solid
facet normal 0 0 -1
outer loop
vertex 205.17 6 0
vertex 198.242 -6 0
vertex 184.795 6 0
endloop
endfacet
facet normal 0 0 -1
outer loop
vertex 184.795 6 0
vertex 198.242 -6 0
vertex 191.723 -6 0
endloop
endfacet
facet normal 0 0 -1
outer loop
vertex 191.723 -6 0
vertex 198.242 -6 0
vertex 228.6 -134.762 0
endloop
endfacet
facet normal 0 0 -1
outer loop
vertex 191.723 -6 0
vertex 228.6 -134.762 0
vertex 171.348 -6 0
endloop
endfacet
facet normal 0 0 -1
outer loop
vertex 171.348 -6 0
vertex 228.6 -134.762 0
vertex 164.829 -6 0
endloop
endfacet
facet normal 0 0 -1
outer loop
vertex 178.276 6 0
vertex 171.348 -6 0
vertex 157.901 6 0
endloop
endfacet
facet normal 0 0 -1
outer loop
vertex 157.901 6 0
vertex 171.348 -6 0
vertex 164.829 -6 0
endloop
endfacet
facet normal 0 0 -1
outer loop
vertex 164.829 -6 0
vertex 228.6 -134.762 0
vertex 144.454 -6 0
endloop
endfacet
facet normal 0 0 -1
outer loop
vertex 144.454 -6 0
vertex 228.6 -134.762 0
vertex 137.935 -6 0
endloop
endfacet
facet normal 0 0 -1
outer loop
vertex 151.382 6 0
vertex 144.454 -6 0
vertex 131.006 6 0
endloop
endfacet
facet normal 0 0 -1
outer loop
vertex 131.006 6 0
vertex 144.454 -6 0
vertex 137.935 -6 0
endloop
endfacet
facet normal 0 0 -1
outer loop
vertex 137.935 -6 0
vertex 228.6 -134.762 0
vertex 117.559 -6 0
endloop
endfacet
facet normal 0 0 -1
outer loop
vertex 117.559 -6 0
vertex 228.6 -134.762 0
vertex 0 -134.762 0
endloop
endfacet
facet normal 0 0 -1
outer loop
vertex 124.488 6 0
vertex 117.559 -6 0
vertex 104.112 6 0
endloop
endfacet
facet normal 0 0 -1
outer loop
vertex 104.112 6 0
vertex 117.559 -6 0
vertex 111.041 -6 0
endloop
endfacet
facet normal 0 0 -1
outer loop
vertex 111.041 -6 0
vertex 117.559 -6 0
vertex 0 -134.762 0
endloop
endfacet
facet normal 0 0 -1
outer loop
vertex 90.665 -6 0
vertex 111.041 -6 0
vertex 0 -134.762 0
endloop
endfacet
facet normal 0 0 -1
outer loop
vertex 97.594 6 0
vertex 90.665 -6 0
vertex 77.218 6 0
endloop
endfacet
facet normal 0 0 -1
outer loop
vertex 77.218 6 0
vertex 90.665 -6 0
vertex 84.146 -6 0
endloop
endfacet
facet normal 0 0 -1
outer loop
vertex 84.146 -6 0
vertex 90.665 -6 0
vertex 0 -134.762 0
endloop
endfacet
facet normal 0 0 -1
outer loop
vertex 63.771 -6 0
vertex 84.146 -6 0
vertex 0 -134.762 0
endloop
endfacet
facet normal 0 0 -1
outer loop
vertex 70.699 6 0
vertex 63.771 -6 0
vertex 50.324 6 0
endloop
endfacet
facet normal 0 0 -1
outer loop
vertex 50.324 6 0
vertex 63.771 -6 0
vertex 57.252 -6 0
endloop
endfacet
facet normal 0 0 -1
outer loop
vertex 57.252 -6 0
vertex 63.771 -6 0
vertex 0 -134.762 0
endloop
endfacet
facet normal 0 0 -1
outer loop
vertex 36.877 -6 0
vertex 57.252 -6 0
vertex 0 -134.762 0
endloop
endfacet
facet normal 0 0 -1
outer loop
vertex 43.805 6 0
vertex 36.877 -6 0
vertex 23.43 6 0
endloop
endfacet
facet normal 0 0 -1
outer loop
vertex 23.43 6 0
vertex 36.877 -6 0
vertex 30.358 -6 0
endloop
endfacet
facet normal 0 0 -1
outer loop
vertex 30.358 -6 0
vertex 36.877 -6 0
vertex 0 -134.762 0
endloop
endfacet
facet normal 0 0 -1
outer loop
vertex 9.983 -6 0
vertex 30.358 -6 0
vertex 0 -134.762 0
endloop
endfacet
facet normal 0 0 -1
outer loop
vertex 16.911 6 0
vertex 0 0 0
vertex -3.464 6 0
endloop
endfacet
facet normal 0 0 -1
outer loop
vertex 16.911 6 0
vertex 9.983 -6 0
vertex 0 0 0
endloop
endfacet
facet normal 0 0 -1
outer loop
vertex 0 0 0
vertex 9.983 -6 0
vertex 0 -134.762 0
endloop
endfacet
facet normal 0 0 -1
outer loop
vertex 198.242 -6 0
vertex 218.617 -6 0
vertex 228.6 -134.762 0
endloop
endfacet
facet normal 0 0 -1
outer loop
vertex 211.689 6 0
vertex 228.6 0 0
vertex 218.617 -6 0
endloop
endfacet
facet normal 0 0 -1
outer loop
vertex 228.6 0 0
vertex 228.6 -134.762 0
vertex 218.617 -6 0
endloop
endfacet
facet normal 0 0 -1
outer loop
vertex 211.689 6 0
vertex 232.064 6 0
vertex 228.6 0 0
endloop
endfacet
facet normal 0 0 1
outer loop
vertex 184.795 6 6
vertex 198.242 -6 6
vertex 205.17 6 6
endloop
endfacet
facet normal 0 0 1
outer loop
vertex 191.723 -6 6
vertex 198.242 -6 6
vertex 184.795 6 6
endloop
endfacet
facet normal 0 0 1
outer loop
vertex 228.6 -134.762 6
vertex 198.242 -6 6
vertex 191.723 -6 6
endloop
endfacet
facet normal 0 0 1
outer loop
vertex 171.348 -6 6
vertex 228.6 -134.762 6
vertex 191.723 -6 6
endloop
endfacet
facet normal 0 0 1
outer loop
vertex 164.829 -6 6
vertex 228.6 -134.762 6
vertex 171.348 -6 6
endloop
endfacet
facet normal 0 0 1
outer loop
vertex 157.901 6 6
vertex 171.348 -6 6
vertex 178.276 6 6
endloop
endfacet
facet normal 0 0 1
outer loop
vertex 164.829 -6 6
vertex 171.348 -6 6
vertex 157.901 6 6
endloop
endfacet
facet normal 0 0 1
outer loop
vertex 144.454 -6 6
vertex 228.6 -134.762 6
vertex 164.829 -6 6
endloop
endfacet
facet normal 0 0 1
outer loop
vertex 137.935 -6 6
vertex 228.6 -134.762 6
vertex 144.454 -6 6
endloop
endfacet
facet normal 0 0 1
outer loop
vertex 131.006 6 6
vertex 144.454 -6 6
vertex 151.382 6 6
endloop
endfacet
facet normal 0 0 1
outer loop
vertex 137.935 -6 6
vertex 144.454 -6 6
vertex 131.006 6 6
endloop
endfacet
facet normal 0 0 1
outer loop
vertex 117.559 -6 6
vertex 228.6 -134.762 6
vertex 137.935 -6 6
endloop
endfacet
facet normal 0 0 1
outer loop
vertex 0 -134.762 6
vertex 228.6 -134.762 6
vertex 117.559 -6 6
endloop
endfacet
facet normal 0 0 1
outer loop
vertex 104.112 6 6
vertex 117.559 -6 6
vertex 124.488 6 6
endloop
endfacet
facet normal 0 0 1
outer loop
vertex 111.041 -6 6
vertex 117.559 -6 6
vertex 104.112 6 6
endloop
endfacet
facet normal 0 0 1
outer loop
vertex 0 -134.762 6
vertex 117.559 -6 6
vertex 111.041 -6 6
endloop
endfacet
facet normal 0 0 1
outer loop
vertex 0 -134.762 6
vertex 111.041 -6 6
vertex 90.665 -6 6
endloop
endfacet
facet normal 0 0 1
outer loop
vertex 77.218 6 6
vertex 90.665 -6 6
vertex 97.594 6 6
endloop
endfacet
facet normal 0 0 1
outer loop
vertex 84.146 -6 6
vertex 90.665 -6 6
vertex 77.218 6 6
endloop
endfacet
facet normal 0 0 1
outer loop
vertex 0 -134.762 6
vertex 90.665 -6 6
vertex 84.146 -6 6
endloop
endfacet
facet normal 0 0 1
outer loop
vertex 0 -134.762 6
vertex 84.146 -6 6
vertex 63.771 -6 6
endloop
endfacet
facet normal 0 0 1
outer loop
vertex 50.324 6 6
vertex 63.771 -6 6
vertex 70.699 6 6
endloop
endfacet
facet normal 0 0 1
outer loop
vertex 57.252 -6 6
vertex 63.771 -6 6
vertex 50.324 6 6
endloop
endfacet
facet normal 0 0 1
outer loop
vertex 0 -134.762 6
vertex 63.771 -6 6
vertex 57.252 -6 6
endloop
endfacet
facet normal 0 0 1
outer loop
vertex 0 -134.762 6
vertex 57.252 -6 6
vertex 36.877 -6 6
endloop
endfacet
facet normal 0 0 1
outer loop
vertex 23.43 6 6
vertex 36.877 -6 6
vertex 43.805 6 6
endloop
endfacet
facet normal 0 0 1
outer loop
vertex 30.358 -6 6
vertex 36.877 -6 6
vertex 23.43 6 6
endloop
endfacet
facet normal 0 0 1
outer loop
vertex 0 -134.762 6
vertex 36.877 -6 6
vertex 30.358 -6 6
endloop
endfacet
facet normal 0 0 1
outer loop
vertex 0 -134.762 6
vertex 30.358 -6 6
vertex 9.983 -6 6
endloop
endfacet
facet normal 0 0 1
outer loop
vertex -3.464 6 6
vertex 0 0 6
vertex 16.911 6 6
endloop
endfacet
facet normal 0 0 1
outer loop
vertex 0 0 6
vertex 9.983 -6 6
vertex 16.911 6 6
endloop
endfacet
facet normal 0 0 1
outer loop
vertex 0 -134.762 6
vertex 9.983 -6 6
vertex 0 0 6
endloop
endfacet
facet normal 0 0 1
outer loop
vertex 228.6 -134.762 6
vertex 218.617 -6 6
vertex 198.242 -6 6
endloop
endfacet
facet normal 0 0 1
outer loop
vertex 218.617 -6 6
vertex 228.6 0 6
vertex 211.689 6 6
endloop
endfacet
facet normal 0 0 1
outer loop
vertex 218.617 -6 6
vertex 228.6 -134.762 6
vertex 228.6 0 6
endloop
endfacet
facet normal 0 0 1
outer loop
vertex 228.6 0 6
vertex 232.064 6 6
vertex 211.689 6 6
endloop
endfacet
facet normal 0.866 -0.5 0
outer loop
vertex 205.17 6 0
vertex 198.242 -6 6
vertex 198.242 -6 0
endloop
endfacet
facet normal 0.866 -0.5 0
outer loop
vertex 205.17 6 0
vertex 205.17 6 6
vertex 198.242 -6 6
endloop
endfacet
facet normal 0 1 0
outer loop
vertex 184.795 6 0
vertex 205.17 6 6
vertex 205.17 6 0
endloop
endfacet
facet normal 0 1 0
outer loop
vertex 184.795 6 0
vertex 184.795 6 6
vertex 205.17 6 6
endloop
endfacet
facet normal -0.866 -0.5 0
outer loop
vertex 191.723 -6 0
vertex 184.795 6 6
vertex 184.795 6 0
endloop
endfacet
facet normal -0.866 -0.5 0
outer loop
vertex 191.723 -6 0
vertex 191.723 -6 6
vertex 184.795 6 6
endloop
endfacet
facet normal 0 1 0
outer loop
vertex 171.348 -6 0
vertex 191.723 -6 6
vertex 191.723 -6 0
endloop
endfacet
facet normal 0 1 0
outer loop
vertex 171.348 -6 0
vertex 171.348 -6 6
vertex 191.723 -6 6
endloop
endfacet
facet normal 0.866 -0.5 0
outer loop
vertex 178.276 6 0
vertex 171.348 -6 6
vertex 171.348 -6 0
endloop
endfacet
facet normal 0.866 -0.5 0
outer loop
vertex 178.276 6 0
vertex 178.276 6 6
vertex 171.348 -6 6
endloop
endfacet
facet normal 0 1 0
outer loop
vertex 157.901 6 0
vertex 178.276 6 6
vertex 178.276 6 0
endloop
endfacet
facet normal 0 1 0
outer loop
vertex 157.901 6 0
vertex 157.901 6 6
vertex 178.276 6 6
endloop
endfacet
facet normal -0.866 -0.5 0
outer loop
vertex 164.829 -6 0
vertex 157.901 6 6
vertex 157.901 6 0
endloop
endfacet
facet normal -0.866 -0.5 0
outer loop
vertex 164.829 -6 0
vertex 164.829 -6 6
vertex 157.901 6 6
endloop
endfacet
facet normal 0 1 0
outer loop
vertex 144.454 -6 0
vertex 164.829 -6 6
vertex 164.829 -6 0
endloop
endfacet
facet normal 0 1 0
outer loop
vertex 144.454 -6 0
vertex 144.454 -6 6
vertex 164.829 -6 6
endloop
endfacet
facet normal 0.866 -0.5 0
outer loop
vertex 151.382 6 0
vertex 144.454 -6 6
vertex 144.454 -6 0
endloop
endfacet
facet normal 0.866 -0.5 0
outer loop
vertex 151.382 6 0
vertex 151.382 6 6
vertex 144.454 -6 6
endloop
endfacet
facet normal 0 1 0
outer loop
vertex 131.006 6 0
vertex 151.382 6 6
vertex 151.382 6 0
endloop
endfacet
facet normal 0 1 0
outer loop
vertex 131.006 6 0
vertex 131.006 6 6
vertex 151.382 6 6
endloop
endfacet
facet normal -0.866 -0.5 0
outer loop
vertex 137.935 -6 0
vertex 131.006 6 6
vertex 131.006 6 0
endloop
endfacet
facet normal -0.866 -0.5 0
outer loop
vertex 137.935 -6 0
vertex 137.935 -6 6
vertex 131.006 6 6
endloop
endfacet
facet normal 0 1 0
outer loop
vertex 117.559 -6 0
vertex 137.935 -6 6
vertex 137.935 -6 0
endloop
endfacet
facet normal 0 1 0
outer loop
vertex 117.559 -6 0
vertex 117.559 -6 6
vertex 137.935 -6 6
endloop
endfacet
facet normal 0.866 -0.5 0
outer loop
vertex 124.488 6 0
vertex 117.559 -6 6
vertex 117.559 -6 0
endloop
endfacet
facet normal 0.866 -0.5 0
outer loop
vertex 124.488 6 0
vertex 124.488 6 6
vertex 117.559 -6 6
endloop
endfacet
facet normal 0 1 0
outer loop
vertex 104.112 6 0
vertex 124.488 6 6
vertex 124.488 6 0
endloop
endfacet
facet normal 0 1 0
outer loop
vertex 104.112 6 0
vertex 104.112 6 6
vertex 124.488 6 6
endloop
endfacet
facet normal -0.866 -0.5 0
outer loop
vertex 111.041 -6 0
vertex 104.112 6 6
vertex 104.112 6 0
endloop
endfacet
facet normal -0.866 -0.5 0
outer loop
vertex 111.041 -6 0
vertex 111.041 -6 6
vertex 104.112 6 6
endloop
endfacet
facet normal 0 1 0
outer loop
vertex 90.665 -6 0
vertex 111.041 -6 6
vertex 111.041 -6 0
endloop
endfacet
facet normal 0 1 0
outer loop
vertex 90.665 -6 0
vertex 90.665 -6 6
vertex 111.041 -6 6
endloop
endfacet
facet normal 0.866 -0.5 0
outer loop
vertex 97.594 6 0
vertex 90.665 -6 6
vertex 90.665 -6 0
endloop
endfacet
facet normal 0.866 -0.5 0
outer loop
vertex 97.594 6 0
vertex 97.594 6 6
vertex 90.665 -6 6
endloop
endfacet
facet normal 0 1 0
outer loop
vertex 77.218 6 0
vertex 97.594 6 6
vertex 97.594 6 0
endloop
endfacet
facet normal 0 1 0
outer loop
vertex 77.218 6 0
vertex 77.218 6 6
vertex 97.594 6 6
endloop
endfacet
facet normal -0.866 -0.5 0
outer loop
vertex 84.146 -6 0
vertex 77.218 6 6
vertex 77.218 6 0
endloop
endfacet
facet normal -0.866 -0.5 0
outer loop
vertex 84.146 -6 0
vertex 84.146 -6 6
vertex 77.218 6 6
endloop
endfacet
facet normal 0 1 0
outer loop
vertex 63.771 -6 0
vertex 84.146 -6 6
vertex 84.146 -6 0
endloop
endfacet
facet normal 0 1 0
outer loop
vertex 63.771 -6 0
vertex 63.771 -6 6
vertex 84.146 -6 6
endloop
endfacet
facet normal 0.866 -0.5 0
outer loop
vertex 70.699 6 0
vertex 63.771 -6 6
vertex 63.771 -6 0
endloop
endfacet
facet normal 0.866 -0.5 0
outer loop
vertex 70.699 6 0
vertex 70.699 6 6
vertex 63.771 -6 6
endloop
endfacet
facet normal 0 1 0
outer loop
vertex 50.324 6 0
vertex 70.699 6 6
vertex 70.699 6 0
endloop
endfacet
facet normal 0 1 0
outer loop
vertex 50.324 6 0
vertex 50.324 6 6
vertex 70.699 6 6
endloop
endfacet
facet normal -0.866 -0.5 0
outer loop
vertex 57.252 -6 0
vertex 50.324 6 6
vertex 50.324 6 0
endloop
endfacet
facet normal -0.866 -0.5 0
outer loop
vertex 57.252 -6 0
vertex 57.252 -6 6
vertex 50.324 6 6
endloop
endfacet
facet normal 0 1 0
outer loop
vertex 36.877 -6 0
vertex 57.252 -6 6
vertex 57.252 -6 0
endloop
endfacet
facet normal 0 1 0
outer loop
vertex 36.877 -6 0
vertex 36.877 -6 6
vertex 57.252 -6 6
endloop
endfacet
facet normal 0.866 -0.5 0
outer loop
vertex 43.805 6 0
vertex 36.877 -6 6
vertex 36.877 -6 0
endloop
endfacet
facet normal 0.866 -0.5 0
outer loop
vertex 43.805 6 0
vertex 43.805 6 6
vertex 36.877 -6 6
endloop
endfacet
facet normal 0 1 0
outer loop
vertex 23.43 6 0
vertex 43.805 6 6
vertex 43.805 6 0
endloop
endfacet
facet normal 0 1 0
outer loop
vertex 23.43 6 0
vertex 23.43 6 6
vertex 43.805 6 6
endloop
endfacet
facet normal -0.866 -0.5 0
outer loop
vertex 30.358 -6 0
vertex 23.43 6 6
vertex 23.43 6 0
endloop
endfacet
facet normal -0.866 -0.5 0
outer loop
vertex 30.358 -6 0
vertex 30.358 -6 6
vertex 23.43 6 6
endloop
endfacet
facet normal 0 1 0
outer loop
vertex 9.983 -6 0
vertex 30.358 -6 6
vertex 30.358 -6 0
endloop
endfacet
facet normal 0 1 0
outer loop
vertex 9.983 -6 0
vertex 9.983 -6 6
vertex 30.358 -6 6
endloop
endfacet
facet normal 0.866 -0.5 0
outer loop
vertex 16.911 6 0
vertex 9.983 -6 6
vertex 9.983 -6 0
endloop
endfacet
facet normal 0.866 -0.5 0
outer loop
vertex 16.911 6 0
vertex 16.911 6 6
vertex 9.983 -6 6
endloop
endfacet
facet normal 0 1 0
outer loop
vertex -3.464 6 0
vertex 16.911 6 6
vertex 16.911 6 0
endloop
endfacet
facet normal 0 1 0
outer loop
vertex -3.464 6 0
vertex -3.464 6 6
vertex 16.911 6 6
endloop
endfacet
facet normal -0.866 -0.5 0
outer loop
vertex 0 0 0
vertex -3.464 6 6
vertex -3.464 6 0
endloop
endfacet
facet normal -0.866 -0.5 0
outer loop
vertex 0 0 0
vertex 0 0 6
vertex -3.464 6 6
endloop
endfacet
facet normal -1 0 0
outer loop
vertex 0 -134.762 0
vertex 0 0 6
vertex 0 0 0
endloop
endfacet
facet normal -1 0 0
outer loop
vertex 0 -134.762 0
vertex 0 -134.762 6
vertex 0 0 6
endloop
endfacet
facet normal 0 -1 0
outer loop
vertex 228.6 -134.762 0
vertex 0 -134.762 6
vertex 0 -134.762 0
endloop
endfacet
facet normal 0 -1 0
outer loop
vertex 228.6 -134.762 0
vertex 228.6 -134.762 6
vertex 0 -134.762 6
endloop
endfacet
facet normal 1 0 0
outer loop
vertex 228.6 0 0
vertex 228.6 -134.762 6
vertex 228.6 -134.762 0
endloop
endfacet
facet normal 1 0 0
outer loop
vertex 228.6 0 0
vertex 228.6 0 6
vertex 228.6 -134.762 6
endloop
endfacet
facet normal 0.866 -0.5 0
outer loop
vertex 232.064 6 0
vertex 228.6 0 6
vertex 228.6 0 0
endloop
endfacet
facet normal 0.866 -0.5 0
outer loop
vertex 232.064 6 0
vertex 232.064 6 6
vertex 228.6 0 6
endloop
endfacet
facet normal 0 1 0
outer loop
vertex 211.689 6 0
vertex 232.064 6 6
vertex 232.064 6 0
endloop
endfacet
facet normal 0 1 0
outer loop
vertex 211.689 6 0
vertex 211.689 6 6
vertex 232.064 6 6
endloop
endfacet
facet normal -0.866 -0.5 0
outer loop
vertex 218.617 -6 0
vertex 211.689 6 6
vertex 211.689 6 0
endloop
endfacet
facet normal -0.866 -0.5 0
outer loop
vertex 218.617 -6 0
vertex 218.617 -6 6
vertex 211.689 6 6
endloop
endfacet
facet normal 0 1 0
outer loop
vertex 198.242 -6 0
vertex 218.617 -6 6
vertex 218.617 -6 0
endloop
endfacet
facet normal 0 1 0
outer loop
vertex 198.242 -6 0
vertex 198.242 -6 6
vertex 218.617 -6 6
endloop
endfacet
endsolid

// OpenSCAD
// =============================================================================
// CONSOLE10 — Bottom Panel Half  v2.4
// Flat 6 mm panel with 4 mm cheek-tabs at each outer edge and a trapezoidal
// dovetail castellation at the centerline (30° from vertical, Apollo 13
// command module flight console reference).
//
// Two parts: LEFT half (9 tabs) and RIGHT half (8 tabs). Set is_left_half
// below to choose which half this build produces.
//
// Halves are joined by PLA solvent/glue along the dovetail seam. No screws,
// no heat-set inserts, no rabbet.
//
// Print orientation: flat on bed, either face down (geometry is symmetric
// across the panel-thickness midplane).
// =============================================================================

is_left_half = true;       // true = LEFT, false = RIGHT

// ---------- LOCKED PARAMETERS -----------------------------------------------
panel_depth       = 228.6;     // x: front-back
panel_thick       = 6;         // z: thickness
interior_width    = 261.525;
panel_half_width  = interior_width / 2;
cheek_tab         = 4;

// Castellation
n_segments        = 17;        // 9 tabs + 8 slots (LEFT); 8 tabs + 9 slots (RIGHT)
tab_protrude      = 6;
wedge_angle       = 30;

// ---------- DERIVED ---------------------------------------------------------
seg_pitch         = panel_depth / n_segments;                          // 13.4471 mm
tab_base          = seg_pitch;                                         // 13.4471 mm
tab_tip           = seg_pitch + 2 * tab_protrude * tan(wedge_angle);   // 20.375 mm

echo("=== Console10 bottom panel half v2.4 ===");
echo(str("  is_left_half  = ", is_left_half));
echo(str("  seg_pitch     = ", seg_pitch, " mm"));
echo(str("  tab_base/tip  = ", tab_base, " / ", tab_tip, " mm"));

// ---------- 2D HALF GEOMETRY ------------------------------------------------
function this_tab_segs()  = is_left_half ? [1,3,5,7,9,11,13,15,17] : [2,4,6,8,10,12,14,16];
function this_slot_segs() = is_left_half ? [2,4,6,8,10,12,14,16] : [1,3,5,7,9,11,13,15,17];

module tab_at(seg_idx) {
    cx = (seg_idx - 0.5) * seg_pitch;
    dir = is_left_half ? 1 : -1;
    polygon([
        [cx - tab_base/2, 0],
        [cx + tab_base/2, 0],
        [cx + tab_tip/2,  dir * tab_protrude],
        [cx - tab_tip/2,  dir * tab_protrude]
    ]);
}

module slot_at(seg_idx) {
    cx = (seg_idx - 0.5) * seg_pitch;
    dir = is_left_half ? -1 : 1;
    polygon([
        [cx - tab_base/2, 0],
        [cx + tab_base/2, 0],
        [cx + tab_tip/2,  dir * tab_protrude],
        [cx - tab_tip/2,  dir * tab_protrude]
    ]);
}

module body_rect_2d() {
    if (is_left_half) {
        translate([0, -(panel_half_width + cheek_tab)])
            square([panel_depth, panel_half_width + cheek_tab]);
    } else {
        square([panel_depth, panel_half_width + cheek_tab]);
    }
}

module half_2d() {
    difference() {
        union() {
            body_rect_2d();
            for (s = this_tab_segs()) tab_at(s);
        }
        for (s = this_slot_segs()) slot_at(s);
    }
}

// ---------- ASSEMBLED HALF --------------------------------------------------
module bottom_panel_half() {
    linear_extrude(height = panel_thick)
        half_2d();
}

bottom_panel_half();
